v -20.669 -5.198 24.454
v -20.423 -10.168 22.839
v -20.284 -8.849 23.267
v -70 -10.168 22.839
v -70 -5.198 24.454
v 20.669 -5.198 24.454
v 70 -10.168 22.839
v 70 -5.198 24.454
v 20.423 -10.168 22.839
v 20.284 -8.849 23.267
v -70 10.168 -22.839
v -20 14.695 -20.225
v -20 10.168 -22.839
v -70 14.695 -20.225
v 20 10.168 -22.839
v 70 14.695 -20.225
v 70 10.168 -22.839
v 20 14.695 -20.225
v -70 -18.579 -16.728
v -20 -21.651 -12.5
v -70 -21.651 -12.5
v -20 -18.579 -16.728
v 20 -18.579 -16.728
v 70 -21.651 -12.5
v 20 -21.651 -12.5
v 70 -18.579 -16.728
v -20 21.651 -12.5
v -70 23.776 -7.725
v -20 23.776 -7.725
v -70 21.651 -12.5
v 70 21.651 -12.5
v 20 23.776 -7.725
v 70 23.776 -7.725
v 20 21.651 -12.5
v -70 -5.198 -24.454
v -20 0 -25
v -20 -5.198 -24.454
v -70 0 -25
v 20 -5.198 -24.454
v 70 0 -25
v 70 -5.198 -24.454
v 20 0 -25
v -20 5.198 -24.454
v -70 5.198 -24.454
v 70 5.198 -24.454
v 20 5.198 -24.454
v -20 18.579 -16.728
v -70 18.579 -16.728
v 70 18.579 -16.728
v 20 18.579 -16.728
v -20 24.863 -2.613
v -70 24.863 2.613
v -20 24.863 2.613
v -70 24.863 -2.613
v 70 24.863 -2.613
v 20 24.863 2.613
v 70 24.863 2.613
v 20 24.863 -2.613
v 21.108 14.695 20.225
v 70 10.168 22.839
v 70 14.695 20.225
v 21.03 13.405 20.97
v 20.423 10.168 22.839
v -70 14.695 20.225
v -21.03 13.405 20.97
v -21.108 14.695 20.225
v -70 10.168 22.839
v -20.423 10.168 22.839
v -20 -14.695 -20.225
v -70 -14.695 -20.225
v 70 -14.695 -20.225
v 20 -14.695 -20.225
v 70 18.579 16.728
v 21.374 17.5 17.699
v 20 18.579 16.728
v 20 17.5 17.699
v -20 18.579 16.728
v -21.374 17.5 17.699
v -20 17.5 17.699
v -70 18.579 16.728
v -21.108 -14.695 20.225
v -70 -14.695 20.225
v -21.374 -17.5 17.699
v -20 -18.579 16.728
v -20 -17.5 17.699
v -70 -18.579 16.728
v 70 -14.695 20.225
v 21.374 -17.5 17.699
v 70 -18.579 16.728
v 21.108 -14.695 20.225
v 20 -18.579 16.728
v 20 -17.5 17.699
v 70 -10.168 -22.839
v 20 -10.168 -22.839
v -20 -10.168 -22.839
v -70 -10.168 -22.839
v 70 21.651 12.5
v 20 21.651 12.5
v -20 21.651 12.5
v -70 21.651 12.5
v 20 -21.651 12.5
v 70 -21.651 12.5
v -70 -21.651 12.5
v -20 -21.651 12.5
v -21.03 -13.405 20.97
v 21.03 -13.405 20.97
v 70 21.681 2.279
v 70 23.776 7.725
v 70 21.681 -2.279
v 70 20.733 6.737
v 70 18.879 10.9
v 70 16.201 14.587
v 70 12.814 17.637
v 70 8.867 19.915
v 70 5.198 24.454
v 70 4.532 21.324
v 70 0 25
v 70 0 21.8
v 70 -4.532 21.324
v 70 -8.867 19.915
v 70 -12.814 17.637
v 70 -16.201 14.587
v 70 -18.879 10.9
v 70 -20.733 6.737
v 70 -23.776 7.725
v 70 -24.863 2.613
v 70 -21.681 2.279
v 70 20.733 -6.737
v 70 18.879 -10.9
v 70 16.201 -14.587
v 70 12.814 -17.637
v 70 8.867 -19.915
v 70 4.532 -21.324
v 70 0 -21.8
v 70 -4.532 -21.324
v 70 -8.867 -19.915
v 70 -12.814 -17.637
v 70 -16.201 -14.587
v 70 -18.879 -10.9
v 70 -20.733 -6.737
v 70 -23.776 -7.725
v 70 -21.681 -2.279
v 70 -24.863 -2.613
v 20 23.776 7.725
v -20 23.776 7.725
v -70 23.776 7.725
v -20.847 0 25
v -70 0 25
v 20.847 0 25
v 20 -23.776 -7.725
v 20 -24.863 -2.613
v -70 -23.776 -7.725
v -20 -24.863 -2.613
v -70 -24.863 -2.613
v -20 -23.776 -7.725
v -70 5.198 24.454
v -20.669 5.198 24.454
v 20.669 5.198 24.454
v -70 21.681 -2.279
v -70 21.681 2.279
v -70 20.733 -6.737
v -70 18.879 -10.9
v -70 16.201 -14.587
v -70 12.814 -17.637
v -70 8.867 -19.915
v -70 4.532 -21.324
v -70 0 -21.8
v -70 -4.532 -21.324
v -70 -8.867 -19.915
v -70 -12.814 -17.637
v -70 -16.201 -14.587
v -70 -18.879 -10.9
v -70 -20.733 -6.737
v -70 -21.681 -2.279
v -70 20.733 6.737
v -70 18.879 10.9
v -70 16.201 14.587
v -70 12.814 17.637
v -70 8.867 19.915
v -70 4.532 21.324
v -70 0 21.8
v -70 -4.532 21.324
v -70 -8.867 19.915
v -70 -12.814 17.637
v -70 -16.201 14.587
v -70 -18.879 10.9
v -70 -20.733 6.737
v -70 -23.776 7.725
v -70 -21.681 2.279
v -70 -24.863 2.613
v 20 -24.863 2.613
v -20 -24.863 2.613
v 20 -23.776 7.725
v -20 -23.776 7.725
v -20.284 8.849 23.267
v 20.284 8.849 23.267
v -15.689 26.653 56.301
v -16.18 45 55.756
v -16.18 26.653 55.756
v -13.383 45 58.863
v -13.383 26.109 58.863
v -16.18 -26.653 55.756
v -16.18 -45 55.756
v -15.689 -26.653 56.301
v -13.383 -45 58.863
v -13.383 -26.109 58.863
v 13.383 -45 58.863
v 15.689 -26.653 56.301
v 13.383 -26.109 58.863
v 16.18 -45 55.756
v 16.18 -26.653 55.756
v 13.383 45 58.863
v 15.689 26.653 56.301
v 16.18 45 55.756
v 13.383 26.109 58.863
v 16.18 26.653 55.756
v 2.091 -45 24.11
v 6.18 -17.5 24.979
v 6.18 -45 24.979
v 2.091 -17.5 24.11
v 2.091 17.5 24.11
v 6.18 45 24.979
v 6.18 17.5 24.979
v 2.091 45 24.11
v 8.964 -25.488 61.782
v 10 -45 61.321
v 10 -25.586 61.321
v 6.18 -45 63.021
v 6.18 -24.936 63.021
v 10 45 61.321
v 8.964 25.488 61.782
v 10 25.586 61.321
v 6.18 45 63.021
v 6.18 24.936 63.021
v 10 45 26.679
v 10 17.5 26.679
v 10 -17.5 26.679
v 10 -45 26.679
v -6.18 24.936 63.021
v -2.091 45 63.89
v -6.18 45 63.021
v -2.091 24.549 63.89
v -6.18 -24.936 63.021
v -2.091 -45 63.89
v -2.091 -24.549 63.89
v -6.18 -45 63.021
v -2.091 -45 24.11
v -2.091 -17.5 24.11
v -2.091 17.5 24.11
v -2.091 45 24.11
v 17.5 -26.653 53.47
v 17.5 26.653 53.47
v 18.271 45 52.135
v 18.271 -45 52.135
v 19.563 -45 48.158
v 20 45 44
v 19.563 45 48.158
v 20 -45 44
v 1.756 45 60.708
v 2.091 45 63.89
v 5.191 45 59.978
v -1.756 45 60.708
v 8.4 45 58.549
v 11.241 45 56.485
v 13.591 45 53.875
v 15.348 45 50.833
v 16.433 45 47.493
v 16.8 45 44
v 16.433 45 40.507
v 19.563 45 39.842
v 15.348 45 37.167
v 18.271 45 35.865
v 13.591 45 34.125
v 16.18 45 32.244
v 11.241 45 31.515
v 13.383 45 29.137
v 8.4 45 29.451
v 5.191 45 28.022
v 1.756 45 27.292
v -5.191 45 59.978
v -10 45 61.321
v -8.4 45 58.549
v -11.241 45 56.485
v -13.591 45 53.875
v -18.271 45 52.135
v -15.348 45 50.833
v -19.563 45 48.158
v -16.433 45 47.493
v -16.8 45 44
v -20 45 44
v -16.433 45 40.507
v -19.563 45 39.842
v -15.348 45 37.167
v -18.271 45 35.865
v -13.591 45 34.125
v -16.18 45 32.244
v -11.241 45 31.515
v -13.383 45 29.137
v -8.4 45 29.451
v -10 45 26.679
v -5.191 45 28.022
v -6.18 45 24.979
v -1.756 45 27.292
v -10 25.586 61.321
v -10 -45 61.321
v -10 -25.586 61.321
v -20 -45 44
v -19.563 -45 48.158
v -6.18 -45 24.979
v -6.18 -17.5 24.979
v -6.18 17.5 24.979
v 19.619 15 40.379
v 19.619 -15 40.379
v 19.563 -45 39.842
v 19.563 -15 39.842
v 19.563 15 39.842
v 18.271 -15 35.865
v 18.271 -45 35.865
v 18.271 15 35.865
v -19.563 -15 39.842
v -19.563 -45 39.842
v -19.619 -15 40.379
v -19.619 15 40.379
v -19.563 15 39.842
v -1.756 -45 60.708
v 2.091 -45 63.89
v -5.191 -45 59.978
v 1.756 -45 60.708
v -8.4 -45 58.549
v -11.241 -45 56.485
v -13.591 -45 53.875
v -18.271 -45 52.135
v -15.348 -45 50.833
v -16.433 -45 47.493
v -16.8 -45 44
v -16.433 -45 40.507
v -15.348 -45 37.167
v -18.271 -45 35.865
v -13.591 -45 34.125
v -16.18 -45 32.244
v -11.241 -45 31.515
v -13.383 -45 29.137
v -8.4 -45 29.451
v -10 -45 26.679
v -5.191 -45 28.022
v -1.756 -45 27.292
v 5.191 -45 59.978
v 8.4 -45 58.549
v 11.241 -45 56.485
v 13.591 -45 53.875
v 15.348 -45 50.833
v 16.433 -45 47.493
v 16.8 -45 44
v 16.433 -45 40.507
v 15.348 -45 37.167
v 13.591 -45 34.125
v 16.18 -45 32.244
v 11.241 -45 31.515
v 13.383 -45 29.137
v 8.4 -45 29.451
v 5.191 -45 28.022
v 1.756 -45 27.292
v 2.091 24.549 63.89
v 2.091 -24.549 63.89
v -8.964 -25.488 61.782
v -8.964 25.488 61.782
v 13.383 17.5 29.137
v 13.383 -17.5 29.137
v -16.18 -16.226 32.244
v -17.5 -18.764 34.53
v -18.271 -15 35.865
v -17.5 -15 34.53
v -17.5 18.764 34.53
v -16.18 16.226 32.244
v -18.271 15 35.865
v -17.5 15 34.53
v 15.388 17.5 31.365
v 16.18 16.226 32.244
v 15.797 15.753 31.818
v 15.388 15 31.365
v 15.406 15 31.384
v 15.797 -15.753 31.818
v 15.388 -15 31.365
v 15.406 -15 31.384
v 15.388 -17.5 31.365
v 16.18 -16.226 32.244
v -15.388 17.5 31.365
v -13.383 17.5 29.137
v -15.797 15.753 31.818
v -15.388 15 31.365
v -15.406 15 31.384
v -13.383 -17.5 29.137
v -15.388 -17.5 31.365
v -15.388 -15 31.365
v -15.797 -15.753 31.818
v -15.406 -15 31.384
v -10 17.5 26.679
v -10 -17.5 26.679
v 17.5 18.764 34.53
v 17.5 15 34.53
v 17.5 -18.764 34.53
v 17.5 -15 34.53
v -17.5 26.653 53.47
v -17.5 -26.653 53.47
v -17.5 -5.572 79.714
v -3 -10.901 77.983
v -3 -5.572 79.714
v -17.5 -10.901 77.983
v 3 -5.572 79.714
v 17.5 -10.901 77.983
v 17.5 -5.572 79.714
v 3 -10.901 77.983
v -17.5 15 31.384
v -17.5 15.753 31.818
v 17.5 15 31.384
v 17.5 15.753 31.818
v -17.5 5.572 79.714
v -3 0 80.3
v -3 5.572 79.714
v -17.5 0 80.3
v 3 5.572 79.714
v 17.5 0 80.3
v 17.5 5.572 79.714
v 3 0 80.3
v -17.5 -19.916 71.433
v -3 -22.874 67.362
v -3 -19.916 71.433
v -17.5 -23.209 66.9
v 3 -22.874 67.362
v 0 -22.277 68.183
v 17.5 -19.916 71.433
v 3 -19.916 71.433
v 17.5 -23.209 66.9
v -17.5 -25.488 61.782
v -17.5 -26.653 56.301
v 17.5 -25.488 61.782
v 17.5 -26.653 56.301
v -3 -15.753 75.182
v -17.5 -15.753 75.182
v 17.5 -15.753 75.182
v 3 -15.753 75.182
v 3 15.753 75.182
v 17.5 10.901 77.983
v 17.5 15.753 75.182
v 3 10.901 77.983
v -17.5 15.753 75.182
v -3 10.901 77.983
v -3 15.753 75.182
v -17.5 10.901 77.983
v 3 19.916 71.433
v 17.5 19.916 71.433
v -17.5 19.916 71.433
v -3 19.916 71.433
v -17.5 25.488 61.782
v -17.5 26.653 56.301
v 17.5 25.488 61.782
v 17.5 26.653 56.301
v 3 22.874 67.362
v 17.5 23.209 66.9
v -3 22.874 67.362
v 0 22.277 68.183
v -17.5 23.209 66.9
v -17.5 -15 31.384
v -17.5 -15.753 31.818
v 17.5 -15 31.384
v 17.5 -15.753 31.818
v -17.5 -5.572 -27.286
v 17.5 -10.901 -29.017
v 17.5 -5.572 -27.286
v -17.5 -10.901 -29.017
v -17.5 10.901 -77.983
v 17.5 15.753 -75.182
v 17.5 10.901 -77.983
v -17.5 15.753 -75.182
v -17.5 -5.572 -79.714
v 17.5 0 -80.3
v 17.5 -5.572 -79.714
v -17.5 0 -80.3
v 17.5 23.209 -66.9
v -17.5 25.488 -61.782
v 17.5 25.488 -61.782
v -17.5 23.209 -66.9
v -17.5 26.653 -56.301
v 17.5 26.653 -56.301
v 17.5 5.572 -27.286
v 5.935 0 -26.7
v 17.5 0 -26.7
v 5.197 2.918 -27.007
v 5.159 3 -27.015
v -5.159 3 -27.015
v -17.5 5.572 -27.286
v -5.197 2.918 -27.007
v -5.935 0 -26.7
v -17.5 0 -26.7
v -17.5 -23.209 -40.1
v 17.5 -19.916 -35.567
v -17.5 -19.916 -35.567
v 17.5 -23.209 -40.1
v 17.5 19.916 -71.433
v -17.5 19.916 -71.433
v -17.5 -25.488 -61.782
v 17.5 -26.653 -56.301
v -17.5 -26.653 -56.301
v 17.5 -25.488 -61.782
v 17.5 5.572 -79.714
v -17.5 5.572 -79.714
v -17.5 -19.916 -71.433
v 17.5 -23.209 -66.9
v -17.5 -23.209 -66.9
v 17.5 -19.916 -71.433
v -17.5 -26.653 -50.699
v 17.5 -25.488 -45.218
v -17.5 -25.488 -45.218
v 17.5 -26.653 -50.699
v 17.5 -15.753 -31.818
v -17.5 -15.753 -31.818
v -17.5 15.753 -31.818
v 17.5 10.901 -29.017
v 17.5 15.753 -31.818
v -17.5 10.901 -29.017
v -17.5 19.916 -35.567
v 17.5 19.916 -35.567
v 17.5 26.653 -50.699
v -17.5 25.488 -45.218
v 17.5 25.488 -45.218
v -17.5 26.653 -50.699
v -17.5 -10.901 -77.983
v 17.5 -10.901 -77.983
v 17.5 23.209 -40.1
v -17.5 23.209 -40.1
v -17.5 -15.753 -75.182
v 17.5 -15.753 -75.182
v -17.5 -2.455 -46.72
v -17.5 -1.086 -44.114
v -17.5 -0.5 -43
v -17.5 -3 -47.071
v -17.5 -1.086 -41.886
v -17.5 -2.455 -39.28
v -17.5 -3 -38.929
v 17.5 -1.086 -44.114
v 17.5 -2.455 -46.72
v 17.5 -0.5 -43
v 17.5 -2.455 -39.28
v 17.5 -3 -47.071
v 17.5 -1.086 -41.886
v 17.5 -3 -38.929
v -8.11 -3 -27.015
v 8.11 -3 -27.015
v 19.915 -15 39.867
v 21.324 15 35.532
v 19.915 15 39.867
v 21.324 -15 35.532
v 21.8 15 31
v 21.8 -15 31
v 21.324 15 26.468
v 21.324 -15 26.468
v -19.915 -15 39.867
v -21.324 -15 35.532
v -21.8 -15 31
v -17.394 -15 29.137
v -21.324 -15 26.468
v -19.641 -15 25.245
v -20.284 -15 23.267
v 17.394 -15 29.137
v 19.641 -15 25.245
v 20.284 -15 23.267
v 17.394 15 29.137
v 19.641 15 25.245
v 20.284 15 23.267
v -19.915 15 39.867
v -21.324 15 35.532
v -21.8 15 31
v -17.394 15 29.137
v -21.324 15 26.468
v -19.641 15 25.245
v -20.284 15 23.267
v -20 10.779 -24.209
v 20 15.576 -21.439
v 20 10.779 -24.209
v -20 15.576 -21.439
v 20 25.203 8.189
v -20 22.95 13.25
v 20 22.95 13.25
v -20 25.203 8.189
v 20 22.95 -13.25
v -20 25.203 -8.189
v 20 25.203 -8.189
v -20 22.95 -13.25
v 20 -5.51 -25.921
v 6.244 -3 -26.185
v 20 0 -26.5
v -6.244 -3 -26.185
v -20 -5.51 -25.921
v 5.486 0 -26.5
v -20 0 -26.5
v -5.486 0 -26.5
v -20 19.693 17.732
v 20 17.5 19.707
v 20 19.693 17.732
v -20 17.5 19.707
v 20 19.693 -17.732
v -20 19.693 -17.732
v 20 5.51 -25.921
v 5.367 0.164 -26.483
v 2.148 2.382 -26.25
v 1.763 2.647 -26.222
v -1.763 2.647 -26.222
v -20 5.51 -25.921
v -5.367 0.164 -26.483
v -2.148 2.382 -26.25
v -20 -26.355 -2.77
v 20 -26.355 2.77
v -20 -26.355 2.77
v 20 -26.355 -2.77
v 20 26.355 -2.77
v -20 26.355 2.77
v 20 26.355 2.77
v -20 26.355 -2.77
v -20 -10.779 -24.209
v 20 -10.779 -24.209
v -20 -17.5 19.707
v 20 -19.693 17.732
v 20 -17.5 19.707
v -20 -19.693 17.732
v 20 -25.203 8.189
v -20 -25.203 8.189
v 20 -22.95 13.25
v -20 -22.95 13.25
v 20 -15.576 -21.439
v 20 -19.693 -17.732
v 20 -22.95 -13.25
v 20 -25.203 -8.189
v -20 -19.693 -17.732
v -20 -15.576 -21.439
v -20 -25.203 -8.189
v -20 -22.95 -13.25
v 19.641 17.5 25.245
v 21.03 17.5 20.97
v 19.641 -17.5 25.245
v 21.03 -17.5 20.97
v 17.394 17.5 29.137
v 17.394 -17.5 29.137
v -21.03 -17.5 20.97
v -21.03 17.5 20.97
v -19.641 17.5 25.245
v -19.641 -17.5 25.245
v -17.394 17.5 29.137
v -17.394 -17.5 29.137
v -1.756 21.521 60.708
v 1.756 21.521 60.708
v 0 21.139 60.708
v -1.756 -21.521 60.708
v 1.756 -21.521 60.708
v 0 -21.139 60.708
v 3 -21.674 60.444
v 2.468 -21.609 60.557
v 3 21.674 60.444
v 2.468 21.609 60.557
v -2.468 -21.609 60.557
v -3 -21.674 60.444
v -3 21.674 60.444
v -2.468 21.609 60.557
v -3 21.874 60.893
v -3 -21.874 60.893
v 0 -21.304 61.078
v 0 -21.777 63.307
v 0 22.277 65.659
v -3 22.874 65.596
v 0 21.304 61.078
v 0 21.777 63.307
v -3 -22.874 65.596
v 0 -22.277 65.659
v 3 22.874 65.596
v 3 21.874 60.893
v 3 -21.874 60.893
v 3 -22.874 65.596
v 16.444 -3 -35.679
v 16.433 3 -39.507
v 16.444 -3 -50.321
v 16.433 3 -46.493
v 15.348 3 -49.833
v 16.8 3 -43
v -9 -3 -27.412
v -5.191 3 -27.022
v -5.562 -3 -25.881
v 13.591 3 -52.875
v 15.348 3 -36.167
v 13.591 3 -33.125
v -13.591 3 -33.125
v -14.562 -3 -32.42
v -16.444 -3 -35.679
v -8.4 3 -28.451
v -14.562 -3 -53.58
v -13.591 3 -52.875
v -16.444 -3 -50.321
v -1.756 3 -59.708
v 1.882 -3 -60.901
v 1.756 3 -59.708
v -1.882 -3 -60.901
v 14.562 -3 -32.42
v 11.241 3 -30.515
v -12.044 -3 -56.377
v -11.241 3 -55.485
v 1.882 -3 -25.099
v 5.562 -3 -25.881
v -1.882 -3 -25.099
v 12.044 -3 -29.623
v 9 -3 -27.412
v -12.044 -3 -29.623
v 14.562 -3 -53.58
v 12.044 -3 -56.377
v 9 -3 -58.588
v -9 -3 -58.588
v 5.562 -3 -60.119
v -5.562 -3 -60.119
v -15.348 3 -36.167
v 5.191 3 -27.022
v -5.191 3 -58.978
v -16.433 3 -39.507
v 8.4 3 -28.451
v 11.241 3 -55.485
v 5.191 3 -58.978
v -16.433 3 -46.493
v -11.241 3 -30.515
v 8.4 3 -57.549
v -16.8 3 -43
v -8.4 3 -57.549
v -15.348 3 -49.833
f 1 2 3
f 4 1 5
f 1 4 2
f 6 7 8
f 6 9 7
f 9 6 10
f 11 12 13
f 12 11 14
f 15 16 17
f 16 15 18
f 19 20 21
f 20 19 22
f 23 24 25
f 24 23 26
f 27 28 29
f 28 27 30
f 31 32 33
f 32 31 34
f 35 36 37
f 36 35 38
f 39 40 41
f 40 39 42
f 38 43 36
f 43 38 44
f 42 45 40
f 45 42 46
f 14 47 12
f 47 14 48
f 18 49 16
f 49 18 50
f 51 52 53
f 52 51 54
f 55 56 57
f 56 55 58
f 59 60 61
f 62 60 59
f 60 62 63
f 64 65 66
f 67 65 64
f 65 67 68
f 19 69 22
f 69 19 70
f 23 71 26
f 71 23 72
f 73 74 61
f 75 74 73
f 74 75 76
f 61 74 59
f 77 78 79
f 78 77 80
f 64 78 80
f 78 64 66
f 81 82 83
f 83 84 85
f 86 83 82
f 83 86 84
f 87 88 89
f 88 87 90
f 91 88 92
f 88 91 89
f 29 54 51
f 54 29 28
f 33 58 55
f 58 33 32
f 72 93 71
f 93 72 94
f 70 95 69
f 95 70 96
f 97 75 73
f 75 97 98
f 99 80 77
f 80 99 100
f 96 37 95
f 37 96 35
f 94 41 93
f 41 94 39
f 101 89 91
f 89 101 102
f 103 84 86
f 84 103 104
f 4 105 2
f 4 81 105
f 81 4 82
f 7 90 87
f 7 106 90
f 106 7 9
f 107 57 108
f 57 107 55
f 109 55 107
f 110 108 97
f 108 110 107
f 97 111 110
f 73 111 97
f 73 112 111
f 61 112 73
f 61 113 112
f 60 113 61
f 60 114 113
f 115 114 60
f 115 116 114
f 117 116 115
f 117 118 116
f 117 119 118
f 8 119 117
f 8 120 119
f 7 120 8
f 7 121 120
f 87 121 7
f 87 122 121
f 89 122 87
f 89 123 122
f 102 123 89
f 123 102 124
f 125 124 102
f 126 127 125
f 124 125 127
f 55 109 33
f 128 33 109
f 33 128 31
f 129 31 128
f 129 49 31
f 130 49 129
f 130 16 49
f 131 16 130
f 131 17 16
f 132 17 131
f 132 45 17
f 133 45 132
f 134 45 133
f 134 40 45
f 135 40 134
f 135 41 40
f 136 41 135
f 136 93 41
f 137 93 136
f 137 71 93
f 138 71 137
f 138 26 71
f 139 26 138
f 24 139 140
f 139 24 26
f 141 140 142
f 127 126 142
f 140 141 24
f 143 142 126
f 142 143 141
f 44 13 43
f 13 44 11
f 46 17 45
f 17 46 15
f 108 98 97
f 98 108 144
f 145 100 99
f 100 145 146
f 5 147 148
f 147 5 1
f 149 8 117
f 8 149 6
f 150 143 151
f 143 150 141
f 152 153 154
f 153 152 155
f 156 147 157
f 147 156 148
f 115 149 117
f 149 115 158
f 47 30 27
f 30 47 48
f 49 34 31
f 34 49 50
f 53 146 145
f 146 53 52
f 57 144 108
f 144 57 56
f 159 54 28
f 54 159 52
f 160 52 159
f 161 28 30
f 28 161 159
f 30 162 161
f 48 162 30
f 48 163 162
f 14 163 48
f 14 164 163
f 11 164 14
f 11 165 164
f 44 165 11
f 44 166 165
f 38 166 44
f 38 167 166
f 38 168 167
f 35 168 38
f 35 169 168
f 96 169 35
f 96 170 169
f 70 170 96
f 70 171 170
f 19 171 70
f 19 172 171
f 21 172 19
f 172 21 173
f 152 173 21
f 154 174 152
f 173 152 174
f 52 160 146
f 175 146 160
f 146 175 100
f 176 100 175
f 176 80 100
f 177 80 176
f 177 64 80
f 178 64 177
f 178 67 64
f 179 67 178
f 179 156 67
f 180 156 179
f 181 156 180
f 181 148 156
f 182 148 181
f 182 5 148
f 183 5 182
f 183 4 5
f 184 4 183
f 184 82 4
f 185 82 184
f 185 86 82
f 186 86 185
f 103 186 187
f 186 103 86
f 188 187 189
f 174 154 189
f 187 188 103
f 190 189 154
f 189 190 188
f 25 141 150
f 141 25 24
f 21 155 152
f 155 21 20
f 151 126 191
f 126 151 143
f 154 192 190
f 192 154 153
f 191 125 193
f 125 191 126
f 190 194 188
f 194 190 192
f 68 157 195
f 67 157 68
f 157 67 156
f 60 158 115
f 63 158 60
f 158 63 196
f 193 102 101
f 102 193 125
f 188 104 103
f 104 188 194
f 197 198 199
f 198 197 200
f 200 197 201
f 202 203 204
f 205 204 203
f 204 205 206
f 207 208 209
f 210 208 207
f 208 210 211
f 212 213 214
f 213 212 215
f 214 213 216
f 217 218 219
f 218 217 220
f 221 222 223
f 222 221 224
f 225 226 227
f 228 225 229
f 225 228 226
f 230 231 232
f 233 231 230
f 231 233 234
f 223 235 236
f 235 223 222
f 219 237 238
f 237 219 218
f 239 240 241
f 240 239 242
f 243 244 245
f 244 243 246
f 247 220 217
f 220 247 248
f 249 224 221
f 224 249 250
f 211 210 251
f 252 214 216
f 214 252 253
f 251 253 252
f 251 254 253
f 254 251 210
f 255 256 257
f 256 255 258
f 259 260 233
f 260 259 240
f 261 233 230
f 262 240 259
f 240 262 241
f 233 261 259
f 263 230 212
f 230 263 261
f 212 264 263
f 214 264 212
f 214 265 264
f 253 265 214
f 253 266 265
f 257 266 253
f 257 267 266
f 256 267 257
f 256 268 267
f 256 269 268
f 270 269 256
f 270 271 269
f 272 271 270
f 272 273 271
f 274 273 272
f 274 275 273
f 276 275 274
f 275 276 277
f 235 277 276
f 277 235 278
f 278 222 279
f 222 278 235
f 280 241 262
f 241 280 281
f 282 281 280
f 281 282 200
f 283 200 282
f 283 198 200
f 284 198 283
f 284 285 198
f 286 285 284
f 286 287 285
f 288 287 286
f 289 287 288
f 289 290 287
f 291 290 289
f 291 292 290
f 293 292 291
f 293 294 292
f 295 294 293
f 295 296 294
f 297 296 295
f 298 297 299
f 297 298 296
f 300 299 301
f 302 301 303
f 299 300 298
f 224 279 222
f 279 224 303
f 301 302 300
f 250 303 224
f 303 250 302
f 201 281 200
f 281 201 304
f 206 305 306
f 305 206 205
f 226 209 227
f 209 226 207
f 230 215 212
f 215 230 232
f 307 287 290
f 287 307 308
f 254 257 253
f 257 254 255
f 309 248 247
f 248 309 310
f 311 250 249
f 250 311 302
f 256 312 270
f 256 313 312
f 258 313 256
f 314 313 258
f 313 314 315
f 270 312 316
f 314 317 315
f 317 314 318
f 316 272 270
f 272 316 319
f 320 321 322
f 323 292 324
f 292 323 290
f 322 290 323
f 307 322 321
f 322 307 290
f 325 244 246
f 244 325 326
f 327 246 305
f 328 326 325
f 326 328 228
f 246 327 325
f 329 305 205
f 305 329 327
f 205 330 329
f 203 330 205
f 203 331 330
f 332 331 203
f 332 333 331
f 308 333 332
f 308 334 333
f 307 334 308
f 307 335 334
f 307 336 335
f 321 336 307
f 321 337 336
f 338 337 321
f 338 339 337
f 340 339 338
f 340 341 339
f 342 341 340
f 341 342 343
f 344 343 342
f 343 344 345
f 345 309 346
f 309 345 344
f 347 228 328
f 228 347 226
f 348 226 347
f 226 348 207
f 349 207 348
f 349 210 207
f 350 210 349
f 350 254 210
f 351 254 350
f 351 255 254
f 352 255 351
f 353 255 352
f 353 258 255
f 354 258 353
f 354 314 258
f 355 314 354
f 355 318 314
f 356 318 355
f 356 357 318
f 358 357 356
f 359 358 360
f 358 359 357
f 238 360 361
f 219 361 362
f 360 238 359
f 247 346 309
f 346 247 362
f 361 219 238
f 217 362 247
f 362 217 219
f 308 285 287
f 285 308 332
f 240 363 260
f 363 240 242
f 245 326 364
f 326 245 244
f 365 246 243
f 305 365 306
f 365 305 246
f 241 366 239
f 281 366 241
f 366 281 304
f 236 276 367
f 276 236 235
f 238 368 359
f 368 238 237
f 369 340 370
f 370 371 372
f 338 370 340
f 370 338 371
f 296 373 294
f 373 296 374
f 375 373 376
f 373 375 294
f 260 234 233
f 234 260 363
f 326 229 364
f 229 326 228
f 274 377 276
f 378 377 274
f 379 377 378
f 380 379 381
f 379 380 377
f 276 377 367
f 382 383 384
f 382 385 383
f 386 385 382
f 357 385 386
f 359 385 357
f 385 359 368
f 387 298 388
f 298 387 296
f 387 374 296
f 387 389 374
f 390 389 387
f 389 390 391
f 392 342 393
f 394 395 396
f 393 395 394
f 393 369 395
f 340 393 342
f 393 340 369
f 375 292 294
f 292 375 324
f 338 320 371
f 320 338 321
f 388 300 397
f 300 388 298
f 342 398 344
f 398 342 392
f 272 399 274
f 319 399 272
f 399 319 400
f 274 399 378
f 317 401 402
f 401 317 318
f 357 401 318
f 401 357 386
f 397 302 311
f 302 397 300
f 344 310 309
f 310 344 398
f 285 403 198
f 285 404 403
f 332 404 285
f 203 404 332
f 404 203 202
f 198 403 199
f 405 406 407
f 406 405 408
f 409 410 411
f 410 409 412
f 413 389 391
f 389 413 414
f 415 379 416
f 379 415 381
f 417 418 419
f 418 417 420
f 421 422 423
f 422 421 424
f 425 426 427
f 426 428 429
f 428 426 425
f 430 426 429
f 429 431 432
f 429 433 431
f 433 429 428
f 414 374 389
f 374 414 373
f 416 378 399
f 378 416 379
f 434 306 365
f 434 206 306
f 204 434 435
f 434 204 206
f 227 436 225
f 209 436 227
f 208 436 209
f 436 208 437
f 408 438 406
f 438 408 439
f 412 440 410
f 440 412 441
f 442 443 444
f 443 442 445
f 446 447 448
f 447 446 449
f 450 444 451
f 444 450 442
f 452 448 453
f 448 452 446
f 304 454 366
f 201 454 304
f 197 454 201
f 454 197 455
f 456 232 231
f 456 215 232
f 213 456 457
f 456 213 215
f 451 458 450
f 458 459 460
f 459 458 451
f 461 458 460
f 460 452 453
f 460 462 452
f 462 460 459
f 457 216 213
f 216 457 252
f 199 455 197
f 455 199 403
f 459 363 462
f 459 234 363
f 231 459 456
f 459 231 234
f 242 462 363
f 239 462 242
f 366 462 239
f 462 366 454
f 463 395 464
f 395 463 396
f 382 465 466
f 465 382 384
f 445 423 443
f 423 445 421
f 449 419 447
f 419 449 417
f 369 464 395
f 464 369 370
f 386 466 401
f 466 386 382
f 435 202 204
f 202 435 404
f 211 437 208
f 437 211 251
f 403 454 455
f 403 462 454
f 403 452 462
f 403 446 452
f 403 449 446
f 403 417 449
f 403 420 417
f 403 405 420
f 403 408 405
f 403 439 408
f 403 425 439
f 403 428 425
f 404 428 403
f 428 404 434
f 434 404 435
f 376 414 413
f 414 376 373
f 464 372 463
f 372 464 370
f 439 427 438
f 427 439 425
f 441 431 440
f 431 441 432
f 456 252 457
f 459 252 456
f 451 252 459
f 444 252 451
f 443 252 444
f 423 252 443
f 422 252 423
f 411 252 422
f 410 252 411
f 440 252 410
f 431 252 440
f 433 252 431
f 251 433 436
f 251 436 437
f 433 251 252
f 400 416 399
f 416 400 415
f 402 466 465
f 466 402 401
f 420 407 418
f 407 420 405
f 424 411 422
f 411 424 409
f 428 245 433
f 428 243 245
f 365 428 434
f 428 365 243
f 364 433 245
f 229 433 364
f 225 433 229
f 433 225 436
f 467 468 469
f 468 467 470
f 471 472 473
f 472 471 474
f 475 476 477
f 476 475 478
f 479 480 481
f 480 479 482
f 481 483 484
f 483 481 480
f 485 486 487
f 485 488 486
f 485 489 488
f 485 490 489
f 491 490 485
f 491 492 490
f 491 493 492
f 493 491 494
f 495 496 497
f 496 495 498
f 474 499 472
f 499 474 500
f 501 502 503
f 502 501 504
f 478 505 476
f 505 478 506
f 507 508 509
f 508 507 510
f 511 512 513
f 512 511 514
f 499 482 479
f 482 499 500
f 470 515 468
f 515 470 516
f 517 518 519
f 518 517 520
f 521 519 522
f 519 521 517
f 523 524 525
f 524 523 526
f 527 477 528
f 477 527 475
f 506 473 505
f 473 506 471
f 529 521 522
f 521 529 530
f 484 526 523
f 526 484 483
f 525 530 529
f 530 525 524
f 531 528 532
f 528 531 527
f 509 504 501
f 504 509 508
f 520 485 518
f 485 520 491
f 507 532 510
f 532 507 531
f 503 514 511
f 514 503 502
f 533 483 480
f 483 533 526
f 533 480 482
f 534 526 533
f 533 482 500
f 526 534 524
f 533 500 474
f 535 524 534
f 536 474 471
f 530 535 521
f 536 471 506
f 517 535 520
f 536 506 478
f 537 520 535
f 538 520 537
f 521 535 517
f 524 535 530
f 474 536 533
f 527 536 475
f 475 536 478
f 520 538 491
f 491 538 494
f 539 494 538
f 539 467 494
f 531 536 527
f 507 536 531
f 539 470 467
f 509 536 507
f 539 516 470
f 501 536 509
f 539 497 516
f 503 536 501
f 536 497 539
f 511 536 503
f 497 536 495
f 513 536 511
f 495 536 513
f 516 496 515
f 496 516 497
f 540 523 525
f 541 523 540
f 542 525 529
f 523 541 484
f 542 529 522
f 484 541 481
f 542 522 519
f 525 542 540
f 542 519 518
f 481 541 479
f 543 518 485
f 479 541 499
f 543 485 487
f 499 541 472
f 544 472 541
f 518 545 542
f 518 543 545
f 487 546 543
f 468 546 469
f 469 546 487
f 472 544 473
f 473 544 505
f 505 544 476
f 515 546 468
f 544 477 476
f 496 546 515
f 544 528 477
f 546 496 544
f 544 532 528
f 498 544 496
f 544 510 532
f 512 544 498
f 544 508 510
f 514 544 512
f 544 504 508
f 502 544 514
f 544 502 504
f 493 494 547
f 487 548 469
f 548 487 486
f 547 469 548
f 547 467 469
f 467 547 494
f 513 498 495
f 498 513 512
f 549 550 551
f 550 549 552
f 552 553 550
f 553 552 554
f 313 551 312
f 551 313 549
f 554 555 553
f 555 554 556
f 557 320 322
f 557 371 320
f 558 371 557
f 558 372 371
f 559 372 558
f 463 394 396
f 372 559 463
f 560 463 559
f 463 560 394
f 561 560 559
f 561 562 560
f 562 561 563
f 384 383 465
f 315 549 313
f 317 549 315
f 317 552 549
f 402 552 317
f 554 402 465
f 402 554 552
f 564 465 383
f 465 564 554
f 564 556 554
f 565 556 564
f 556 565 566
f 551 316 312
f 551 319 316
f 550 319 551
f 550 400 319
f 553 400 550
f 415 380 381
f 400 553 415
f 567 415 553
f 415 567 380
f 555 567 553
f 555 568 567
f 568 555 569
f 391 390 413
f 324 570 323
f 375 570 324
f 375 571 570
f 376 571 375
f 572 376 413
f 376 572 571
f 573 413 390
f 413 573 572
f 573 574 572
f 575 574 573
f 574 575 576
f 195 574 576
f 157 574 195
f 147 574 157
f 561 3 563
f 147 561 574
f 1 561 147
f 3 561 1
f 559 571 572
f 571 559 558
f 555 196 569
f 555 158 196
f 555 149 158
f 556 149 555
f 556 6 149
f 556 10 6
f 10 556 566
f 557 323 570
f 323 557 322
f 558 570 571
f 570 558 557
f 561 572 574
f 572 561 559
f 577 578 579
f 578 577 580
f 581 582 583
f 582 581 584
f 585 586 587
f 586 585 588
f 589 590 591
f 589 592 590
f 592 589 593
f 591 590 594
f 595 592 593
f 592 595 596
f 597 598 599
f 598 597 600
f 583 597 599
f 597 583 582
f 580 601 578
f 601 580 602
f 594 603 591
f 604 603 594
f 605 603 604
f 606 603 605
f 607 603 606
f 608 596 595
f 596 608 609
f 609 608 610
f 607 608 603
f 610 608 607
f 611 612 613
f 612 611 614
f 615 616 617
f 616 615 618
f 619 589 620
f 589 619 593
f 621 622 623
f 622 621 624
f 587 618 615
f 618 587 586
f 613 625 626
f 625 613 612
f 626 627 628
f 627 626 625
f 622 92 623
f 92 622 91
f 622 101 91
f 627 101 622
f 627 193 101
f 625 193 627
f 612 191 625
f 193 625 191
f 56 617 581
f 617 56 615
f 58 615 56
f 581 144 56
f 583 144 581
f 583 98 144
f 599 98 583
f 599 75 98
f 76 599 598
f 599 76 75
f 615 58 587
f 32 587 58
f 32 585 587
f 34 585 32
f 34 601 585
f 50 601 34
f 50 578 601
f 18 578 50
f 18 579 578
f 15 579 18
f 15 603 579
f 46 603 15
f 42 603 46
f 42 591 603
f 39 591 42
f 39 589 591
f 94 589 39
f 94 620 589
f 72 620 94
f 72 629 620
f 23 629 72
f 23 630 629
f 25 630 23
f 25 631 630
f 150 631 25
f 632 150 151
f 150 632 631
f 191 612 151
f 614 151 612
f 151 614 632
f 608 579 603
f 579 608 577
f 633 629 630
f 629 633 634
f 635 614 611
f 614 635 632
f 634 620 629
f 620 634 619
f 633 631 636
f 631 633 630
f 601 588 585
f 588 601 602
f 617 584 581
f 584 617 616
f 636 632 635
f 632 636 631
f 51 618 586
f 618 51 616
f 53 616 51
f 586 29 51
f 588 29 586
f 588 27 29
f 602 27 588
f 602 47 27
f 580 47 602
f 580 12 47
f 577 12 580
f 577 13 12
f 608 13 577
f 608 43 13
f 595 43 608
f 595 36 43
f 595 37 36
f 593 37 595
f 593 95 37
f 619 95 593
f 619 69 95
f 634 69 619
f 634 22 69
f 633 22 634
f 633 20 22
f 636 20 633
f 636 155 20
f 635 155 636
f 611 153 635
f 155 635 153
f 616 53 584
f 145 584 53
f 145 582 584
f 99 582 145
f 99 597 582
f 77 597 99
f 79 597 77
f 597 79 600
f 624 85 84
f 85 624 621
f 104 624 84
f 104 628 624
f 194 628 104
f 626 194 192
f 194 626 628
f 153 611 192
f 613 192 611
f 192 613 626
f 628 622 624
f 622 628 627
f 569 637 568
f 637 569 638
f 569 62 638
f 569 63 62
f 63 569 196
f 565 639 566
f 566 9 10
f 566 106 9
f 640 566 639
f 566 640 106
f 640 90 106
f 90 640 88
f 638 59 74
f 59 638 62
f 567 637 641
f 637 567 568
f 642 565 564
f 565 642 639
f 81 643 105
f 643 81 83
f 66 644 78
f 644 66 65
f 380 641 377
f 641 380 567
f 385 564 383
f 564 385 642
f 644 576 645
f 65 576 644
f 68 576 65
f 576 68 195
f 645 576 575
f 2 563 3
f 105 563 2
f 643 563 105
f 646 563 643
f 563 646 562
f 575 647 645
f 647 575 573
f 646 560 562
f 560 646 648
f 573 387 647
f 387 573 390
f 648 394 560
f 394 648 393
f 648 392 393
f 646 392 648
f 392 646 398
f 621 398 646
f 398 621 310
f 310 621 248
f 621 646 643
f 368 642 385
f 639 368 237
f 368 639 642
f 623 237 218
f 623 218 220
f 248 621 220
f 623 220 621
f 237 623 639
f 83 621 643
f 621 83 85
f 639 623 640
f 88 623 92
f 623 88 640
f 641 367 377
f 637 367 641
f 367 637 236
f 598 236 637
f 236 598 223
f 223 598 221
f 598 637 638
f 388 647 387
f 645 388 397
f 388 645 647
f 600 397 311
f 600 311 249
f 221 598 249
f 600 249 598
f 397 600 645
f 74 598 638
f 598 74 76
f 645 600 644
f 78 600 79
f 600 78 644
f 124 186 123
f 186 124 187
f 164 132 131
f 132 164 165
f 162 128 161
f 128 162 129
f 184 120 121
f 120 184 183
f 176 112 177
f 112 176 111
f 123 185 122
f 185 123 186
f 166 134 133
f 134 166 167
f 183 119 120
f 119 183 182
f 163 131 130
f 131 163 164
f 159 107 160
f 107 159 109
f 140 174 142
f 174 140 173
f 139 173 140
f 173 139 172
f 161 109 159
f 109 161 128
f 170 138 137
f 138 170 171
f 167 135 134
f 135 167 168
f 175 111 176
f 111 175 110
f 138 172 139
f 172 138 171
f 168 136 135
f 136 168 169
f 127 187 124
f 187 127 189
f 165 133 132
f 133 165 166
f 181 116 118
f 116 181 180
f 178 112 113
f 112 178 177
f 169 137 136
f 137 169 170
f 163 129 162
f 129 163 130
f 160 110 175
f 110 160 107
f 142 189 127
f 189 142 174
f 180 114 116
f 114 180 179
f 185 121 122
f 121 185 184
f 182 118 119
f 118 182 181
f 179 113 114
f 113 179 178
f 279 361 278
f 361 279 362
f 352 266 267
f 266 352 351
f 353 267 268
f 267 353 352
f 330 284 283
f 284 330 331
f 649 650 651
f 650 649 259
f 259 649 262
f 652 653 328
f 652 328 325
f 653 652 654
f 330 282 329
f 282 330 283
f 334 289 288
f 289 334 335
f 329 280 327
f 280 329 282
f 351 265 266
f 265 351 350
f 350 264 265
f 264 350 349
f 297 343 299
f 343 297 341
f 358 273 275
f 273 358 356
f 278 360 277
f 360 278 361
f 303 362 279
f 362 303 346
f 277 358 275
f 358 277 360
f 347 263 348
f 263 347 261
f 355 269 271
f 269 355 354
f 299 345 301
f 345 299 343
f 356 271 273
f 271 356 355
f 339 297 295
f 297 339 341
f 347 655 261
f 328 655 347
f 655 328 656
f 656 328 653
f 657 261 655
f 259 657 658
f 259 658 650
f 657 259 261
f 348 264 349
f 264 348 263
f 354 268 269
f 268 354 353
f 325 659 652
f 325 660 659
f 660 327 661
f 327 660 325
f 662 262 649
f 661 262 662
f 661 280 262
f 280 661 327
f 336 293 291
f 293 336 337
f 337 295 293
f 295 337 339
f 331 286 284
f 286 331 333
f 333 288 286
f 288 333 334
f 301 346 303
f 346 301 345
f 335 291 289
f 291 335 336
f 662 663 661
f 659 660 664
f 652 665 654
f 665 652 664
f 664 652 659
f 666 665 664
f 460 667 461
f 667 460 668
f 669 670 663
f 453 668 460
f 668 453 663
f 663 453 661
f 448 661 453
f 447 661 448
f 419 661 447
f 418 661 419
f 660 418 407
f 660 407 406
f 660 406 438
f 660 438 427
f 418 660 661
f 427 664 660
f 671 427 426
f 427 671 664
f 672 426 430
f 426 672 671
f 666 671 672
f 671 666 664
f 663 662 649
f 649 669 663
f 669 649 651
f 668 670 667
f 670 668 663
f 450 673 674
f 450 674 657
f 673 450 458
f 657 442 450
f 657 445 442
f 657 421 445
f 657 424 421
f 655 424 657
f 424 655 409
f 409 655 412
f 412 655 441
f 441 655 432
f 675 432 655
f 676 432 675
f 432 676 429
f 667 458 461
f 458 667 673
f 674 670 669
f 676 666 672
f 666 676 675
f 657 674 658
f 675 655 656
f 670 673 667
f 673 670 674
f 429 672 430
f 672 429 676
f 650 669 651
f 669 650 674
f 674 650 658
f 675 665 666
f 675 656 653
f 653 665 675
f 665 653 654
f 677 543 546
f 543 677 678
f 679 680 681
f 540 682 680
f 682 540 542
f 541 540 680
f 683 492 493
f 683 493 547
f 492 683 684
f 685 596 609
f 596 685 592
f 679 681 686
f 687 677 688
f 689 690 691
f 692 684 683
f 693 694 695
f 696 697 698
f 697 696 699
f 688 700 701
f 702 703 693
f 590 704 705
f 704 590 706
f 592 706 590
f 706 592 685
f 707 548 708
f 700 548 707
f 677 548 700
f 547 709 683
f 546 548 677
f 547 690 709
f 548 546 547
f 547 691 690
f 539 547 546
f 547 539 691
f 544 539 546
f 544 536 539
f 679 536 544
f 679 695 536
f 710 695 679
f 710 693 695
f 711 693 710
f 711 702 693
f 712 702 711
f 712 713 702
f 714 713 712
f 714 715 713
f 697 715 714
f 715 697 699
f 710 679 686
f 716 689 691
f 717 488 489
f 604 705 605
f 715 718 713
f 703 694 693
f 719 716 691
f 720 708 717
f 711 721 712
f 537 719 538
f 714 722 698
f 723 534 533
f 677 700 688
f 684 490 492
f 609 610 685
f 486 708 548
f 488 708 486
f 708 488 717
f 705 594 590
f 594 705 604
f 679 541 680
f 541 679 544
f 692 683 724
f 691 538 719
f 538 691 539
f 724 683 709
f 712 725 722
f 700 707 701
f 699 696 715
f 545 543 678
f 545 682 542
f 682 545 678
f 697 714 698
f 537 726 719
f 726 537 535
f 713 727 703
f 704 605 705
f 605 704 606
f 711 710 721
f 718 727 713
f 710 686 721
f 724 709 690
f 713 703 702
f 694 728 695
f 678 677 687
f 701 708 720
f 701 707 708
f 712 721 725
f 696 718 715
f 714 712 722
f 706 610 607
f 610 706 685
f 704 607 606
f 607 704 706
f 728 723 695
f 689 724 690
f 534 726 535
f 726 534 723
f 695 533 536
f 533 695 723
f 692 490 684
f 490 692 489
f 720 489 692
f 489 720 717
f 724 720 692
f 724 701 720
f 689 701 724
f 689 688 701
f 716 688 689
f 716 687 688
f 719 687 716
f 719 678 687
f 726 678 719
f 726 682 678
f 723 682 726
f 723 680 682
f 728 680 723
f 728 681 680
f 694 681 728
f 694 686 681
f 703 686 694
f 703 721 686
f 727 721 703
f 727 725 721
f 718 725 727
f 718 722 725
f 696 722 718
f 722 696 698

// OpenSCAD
// Parameters
main_nominal_diameter_mm = 50; //[25:100:1]
branch_nominal_diameter_mm = 40; //[20:80:1]
angle_deg = 90; //[45:90:1]
main_run_length_mm = 140; //[80:280:1]
branch_length_mm = 90; //[50:180:1]
wall_thickness_mm = 3.2; //[1.6:6.4:0.1]
socket_depth_main_mm = 35; //[20:70:1]
socket_depth_branch_mm = 30; //[15:60:1]
socket_wall_extra_mm = 1.8; //[0.8:3.6:0.1]
socket_lead_in_length_mm = 6; //[2:15:1]
socket_lead_in_radial_mm = 1.2; //[0.5:3:0.1]
fillet_radius_mm = 6; //[2:15:1]
overlap_mm = 1; //[0.5:2:0.1]
main_od_mm = 50; //[25:100:1]
branch_od_mm = 40; //[20:80:1]
main_id_mm = 43.6; //[20:95:0.1]
branch_id_mm = 33.6; //[15:75:0.1]
junction_length_main_mm = 40; //[20:80:1]
junction_length_branch_mm = 35; //[15:70:1]

// Ht Pipe - complete geometry
module ht_pipe() {
  color([0.85, 0.85, 0.8]) {
    // Main run outer
    rotate([0, 90, 0])
    translate([0, 0, 0])
    cylinder(r=main_od_mm/2, h=main_run_length_mm, center=true);

    // Branch outer
    rotate([90, 0, 0])
    translate([0, branch_length_mm/2 - overlap_mm, 0])
    cylinder(r=branch_od_mm/2, h=branch_length_mm, center=true);

    // Main socket left outer
    rotate([0, 90, 0])
    translate([-main_run_length_mm/2 + socket_depth_main_mm/2 - overlap_mm, 0, 0])
    cylinder(r=main_od_mm/2 + socket_wall_extra_mm, h=socket_depth_main_mm, center=true);

    // Main socket right outer
    rotate([0, 90, 0])
    translate([main_run_length_mm/2 - socket_depth_main_mm/2 + overlap_mm, 0, 0])
    cylinder(r=main_od_mm/2 + socket_wall_extra_mm, h=socket_depth_main_mm, center=true);

    // Branch socket outer
    rotate([90, 0, 0])
    translate([0, branch_length_mm/2 - socket_depth_branch_mm/2 + overlap_mm, 0])
    cylinder(r=branch_od_mm/2 + socket_wall_extra_mm, h=socket_depth_branch_mm, center=true);

    // Junction blend main
    rotate([0, 90, 0])
    translate([0, 0, 0])
    cylinder(r=main_od_mm/2 + fillet_radius_mm*0.25, h=junction_length_main_mm, center=true);

    // Junction blend branch
    rotate([90, 0, 0])
    translate([0, junction_length_branch_mm/2 - overlap_mm, 0])
    cylinder(r=branch_od_mm/2 + fillet_radius_mm*0.25, h=junction_length_branch_mm, center=true);

    // Internal transition sphere
    translate([0, 0, 0])
    sphere(r=max(main_id_mm, branch_id_mm)/2 + wall_thickness_mm*0.25, center=true);
  }
}

// Assembly
module assembly() {
  difference() {
    ht_pipe();
    // Internal bores
    color("White") {
      rotate([0, 90, 0])
      translate([0, 0, 0])
      cylinder(r=main_id_mm/2, h=main_run_length_mm + 2*overlap_mm, center=true);

      rotate([90, 0, 0])
      translate([0, branch_length_mm/2 - overlap_mm, 0])
      cylinder(r=branch_id_mm/2, h=branch_length_mm + 2*overlap_mm, center=true);

      // Main socket left lead-in cut
      rotate([0, 90, 0])
      translate([-main_run_length_mm/2 + socket_lead_in_length_mm/2 - overlap_mm, 0, 0])
      cylinder(r1=main_id_mm/2 + socket_lead_in_radial_mm, r2=main_id_mm/2, h=socket_lead_in_length_mm, center=true);

      // Main socket right lead-in cut
      rotate([0, -90, 0])
      translate([main_run_length_mm/2 - socket_lead_in_length_mm/2 + overlap_mm, 0, 0])
      cylinder(r1=main_id_mm/2 + socket_lead_in_radial_mm, r2=main_id_mm/2, h=socket_lead_in_length_mm, center=true);

      // Branch socket lead-in cut
      rotate([-90, 0, 0])
      translate([0, branch_length_mm/2 - socket_lead_in_length_mm/2 + overlap_mm, 0])
      cylinder(r1=branch_id_mm/2 + socket_lead_in_radial_mm, r2=branch_id_mm/2, h=socket_lead_in_length_mm, center=true);
    }
  }
}

assembly();
